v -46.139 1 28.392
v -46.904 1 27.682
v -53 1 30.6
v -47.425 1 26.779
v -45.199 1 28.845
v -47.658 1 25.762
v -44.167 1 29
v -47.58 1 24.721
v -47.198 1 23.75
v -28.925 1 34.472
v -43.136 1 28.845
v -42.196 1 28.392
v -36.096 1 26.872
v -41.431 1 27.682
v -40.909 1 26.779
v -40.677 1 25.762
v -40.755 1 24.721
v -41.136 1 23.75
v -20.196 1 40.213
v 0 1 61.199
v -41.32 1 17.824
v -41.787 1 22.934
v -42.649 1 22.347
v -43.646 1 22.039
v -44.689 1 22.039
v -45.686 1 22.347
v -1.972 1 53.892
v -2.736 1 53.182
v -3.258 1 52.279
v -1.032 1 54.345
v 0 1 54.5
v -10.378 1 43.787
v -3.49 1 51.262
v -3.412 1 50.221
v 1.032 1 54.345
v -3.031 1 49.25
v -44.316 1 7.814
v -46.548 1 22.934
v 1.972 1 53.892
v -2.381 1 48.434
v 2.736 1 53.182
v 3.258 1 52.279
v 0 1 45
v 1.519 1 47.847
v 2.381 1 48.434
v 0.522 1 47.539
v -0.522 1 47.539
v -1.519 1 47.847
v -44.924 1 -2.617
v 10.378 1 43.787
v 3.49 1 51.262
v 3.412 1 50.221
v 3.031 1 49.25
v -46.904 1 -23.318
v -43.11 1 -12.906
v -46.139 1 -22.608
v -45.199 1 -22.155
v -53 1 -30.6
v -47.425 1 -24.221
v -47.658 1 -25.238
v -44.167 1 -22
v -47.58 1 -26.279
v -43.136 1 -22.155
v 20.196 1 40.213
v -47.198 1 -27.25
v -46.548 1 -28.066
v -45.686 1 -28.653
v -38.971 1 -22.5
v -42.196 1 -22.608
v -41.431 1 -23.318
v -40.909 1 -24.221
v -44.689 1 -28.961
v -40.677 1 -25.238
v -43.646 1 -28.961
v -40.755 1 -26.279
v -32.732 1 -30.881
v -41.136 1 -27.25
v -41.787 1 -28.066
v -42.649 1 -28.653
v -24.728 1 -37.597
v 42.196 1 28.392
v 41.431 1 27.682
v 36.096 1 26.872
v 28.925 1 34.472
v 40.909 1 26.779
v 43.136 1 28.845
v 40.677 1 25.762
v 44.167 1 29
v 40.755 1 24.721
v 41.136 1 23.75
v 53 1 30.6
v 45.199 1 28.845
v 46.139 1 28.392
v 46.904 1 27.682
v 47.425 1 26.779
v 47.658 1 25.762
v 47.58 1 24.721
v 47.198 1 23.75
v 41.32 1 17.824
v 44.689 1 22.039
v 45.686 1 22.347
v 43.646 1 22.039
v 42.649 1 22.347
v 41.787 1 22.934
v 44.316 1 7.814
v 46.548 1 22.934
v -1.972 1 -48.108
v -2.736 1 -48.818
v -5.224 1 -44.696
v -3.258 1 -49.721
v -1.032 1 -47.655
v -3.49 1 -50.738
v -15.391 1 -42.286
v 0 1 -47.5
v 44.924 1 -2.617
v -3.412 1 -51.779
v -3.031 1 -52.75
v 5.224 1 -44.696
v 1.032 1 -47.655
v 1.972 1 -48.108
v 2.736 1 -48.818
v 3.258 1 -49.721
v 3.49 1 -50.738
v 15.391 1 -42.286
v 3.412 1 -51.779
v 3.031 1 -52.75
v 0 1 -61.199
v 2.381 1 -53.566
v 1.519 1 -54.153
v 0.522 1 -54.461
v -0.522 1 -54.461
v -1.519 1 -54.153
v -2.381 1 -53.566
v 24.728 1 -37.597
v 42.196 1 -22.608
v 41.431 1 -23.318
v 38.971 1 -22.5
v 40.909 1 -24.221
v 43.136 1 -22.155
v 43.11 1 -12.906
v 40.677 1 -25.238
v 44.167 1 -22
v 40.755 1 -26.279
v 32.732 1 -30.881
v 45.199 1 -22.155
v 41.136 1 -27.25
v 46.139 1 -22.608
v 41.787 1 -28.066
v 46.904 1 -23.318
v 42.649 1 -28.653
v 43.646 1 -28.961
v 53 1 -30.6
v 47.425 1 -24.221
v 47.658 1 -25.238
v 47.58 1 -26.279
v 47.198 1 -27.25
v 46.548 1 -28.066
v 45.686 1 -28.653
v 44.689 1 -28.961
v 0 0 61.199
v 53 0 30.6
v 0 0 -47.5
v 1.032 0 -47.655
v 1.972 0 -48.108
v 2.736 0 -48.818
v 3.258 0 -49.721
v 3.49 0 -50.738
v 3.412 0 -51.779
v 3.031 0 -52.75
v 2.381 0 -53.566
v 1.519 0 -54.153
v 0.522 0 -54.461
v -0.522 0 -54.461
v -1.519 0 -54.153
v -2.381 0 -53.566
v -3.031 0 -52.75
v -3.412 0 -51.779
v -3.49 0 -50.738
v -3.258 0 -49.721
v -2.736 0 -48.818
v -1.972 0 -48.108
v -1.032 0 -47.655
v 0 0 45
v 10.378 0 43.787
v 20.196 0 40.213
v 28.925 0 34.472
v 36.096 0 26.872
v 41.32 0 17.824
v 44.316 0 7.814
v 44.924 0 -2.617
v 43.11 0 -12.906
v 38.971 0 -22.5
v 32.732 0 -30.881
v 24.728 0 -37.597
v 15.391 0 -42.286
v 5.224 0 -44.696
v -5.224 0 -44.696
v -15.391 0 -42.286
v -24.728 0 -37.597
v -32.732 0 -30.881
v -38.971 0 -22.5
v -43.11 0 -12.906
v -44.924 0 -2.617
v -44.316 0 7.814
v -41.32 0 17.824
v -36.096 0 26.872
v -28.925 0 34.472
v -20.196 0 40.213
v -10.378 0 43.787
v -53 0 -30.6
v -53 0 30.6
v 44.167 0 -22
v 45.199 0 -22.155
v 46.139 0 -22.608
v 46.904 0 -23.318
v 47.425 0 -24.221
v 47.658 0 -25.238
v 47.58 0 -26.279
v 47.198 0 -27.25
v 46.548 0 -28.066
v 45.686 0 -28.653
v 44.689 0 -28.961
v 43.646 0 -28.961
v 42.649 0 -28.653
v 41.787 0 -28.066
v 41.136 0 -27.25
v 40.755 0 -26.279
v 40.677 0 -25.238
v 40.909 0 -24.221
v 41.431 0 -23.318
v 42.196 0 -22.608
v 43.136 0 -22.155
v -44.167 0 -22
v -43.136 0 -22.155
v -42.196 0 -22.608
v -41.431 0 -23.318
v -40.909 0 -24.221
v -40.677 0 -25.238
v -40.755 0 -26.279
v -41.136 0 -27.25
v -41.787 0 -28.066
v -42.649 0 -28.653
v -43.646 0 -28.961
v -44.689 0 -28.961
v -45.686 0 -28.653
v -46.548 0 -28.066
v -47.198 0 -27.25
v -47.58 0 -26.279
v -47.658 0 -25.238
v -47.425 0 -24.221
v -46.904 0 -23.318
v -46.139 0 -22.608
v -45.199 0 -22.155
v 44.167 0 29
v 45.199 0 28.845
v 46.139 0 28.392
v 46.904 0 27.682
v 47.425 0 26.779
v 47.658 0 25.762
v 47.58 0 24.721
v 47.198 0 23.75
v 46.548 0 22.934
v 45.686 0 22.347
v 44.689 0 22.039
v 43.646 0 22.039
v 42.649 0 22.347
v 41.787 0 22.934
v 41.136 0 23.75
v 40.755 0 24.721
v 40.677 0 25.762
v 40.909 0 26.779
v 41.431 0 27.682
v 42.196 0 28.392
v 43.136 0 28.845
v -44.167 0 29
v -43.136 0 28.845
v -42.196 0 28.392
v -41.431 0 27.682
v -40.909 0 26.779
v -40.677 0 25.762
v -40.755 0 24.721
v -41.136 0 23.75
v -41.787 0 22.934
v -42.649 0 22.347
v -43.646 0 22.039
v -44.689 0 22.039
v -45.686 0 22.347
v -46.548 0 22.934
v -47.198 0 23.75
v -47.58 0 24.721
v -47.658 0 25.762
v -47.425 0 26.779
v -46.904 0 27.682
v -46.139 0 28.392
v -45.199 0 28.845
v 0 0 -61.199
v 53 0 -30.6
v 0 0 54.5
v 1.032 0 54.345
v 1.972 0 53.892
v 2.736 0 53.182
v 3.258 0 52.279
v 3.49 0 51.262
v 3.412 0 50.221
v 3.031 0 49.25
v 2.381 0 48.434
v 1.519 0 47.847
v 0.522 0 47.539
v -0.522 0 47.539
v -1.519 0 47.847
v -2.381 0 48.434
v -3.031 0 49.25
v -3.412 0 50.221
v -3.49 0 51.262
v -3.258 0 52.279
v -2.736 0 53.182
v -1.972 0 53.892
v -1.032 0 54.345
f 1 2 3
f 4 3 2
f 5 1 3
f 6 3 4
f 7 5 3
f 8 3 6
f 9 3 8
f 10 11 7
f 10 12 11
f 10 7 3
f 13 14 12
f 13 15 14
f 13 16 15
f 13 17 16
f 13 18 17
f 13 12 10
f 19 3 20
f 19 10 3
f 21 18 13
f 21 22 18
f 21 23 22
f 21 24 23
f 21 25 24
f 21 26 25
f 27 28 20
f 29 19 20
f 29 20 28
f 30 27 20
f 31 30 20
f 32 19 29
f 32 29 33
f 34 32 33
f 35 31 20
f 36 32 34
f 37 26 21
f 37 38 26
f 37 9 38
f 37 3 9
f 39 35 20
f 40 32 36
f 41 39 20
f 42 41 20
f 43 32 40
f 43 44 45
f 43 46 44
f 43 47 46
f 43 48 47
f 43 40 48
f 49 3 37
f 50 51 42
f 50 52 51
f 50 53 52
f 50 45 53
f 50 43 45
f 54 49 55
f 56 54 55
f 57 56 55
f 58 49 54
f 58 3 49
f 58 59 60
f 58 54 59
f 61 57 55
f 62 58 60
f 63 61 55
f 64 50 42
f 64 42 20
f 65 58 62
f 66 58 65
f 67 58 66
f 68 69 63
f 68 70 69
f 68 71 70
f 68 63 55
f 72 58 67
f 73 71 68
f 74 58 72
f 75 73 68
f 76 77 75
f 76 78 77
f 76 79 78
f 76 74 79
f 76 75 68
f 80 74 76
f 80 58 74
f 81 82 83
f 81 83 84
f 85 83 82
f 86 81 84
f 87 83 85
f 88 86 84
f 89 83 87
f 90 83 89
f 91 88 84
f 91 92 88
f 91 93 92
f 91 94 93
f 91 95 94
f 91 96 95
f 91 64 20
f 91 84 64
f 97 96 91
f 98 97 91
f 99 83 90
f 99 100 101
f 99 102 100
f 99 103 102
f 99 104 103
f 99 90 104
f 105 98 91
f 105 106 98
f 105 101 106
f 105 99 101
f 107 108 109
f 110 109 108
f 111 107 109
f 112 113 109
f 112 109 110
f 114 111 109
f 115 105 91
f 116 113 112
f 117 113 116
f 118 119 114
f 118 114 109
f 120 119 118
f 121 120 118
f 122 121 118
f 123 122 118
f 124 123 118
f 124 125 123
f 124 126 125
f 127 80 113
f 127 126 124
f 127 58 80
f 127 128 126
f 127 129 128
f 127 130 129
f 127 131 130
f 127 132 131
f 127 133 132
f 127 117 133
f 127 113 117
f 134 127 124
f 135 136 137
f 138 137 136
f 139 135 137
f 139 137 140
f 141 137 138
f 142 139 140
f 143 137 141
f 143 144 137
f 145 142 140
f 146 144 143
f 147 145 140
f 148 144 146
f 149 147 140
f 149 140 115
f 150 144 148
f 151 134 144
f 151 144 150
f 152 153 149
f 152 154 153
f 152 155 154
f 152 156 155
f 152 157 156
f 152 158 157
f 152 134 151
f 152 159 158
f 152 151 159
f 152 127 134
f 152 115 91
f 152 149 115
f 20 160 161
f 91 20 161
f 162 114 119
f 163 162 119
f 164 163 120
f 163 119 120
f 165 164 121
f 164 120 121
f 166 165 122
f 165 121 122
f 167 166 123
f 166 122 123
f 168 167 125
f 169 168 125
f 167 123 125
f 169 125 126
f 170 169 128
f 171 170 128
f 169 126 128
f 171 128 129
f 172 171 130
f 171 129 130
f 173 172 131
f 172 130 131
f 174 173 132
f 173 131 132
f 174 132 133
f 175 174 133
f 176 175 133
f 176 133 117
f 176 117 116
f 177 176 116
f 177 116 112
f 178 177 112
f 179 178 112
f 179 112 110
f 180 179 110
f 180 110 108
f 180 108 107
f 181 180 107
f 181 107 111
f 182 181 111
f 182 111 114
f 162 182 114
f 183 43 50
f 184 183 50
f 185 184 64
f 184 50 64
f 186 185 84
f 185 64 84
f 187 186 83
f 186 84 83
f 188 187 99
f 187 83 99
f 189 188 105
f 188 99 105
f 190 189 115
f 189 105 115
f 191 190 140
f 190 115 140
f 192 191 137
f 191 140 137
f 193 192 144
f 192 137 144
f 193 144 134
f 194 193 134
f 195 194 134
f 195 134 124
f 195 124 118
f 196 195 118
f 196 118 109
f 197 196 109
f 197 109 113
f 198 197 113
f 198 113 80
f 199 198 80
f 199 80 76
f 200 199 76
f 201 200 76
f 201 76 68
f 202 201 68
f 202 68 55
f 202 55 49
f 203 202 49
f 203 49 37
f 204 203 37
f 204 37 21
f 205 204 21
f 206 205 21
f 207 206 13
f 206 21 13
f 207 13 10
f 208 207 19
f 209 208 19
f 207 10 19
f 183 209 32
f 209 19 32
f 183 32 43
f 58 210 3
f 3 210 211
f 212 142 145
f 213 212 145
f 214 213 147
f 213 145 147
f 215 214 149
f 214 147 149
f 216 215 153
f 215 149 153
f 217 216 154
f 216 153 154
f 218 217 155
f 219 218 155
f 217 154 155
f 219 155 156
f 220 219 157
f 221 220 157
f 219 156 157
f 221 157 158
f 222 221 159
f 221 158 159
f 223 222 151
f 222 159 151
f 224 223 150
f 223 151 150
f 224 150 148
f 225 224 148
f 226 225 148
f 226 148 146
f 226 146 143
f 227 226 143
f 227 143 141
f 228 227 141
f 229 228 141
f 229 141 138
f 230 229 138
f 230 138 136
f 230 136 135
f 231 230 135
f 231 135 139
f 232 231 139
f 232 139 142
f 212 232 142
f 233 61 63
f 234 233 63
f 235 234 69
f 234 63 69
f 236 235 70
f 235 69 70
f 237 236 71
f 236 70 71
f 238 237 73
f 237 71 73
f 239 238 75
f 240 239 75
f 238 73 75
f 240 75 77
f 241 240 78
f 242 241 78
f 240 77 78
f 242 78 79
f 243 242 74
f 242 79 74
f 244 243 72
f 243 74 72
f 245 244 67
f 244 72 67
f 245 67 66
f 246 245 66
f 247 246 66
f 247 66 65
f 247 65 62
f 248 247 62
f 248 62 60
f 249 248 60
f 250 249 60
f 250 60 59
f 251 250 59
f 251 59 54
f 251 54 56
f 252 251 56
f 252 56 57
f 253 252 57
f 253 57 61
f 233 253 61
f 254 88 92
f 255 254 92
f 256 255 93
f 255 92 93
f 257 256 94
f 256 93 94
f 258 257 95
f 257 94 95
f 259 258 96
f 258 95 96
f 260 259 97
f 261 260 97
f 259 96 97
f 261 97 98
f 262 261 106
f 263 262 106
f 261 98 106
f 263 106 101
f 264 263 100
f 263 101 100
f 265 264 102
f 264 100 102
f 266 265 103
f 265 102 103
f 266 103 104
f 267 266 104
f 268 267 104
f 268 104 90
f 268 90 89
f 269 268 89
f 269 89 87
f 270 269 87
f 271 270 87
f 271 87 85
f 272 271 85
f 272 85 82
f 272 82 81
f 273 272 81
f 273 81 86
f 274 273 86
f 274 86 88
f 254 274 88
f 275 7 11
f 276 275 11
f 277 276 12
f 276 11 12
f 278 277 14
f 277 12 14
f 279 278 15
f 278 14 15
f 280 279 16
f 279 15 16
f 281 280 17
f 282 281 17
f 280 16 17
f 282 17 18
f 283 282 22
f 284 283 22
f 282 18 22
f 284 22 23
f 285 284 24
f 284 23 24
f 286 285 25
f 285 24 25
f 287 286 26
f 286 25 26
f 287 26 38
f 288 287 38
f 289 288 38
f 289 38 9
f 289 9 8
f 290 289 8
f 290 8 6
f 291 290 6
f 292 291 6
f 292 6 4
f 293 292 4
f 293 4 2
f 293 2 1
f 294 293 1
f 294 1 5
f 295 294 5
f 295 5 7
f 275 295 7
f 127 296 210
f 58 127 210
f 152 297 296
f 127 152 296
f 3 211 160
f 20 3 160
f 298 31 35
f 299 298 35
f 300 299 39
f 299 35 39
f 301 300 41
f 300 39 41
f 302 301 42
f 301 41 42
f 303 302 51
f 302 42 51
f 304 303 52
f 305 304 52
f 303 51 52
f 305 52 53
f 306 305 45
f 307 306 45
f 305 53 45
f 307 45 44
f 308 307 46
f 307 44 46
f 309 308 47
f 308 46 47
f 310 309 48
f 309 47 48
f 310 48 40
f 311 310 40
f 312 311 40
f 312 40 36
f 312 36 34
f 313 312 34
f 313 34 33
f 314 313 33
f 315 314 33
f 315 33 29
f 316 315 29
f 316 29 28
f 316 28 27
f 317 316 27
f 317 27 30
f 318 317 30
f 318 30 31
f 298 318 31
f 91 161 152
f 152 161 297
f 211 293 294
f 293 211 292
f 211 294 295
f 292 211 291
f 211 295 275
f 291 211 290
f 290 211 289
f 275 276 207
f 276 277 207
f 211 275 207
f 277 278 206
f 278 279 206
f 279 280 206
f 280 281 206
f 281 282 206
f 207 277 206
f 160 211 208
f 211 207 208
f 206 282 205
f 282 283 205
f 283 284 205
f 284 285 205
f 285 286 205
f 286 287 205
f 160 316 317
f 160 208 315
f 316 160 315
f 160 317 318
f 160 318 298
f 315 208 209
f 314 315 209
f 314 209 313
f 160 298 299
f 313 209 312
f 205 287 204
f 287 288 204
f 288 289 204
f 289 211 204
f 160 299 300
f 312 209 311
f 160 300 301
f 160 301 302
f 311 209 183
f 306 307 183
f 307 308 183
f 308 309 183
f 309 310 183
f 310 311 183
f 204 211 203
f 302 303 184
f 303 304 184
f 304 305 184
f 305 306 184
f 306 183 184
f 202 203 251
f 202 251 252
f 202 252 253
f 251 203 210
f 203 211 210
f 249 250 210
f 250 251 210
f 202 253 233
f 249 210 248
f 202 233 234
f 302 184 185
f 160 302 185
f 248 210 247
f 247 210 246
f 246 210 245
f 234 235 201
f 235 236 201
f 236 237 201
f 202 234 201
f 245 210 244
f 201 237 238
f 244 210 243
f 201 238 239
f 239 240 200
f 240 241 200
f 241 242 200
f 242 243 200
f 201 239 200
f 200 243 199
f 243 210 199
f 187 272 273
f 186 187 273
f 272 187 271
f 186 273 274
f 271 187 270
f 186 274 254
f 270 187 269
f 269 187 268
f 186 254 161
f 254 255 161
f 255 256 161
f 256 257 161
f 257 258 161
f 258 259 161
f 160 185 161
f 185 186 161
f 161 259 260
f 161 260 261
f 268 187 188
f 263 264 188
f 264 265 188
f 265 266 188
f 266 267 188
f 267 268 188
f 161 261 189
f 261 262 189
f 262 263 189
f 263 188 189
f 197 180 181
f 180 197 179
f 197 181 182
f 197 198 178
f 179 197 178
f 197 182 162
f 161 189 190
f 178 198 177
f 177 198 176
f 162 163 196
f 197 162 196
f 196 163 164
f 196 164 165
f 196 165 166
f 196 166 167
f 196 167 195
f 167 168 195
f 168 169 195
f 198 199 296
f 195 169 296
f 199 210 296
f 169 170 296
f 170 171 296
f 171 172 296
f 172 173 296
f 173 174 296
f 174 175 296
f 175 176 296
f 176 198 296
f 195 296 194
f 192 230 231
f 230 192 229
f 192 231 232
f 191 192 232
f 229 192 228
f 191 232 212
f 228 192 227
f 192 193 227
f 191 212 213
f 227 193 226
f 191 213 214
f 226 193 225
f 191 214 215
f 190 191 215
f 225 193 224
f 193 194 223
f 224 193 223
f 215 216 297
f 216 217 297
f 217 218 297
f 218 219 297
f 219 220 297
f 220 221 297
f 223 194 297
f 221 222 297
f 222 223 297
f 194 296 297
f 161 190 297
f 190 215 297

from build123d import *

# Parameters (mm, degrees)
BOSS_EXTRUDE1_DEPTH = 1
SKETCH2_R           = 45
SKETCH2_R_2         = 3.5
CUT_EXTRUDE1_DEPTH  = 81.96501302


with BuildPart() as part:
    # Sketch1 → Boss-Extrude1 (new body)
    with BuildSketch(Plane(origin=(0, 0, 0), x_dir=(1, 0, 0), z_dir=(0, 1, 0))):
        Polygon((0, 61.199128534), (-53, 30.599564267), (-53, -30.599564267), (0, -61.199128534), (53, -30.599564267), (53, 30.599564267), align=None)
    extrude(amount=BOSS_EXTRUDE1_DEPTH)

    # Sketch2 → Cut-Extrude1 (cut, through all)
    with BuildSketch(Plane(origin=(0, 1, 0), x_dir=(1, 0, 0), z_dir=(0, 1, 0))):
        with Locations(Location((0, 0, 0), (0, 0, 270))):
            Circle(SKETCH2_R)
        with Locations(Location((0, 51, 0), (0, 0, 270))):
            Circle(SKETCH2_R_2)
        with Locations(Location((44.167295593, 25.5, 0), (0, 0, 270))):
            Circle(SKETCH2_R_2)
        with Locations(Location((44.167295593, -25.5, 0), (0, 0, 270))):
            Circle(SKETCH2_R_2)
        with Locations(Location((0, -51, 0), (0, 0, 270))):
            Circle(SKETCH2_R_2)
        with Locations(Location((-44.167295593, -25.5, 0), (0, 0, 270))):
            Circle(SKETCH2_R_2)
        with Locations(Location((-44.167295593, 25.5, 0), (0, 0, 270))):
            Circle(SKETCH2_R_2)
    extrude(amount=-CUT_EXTRUDE1_DEPTH, mode=Mode.SUBTRACT)


solid = part.part
